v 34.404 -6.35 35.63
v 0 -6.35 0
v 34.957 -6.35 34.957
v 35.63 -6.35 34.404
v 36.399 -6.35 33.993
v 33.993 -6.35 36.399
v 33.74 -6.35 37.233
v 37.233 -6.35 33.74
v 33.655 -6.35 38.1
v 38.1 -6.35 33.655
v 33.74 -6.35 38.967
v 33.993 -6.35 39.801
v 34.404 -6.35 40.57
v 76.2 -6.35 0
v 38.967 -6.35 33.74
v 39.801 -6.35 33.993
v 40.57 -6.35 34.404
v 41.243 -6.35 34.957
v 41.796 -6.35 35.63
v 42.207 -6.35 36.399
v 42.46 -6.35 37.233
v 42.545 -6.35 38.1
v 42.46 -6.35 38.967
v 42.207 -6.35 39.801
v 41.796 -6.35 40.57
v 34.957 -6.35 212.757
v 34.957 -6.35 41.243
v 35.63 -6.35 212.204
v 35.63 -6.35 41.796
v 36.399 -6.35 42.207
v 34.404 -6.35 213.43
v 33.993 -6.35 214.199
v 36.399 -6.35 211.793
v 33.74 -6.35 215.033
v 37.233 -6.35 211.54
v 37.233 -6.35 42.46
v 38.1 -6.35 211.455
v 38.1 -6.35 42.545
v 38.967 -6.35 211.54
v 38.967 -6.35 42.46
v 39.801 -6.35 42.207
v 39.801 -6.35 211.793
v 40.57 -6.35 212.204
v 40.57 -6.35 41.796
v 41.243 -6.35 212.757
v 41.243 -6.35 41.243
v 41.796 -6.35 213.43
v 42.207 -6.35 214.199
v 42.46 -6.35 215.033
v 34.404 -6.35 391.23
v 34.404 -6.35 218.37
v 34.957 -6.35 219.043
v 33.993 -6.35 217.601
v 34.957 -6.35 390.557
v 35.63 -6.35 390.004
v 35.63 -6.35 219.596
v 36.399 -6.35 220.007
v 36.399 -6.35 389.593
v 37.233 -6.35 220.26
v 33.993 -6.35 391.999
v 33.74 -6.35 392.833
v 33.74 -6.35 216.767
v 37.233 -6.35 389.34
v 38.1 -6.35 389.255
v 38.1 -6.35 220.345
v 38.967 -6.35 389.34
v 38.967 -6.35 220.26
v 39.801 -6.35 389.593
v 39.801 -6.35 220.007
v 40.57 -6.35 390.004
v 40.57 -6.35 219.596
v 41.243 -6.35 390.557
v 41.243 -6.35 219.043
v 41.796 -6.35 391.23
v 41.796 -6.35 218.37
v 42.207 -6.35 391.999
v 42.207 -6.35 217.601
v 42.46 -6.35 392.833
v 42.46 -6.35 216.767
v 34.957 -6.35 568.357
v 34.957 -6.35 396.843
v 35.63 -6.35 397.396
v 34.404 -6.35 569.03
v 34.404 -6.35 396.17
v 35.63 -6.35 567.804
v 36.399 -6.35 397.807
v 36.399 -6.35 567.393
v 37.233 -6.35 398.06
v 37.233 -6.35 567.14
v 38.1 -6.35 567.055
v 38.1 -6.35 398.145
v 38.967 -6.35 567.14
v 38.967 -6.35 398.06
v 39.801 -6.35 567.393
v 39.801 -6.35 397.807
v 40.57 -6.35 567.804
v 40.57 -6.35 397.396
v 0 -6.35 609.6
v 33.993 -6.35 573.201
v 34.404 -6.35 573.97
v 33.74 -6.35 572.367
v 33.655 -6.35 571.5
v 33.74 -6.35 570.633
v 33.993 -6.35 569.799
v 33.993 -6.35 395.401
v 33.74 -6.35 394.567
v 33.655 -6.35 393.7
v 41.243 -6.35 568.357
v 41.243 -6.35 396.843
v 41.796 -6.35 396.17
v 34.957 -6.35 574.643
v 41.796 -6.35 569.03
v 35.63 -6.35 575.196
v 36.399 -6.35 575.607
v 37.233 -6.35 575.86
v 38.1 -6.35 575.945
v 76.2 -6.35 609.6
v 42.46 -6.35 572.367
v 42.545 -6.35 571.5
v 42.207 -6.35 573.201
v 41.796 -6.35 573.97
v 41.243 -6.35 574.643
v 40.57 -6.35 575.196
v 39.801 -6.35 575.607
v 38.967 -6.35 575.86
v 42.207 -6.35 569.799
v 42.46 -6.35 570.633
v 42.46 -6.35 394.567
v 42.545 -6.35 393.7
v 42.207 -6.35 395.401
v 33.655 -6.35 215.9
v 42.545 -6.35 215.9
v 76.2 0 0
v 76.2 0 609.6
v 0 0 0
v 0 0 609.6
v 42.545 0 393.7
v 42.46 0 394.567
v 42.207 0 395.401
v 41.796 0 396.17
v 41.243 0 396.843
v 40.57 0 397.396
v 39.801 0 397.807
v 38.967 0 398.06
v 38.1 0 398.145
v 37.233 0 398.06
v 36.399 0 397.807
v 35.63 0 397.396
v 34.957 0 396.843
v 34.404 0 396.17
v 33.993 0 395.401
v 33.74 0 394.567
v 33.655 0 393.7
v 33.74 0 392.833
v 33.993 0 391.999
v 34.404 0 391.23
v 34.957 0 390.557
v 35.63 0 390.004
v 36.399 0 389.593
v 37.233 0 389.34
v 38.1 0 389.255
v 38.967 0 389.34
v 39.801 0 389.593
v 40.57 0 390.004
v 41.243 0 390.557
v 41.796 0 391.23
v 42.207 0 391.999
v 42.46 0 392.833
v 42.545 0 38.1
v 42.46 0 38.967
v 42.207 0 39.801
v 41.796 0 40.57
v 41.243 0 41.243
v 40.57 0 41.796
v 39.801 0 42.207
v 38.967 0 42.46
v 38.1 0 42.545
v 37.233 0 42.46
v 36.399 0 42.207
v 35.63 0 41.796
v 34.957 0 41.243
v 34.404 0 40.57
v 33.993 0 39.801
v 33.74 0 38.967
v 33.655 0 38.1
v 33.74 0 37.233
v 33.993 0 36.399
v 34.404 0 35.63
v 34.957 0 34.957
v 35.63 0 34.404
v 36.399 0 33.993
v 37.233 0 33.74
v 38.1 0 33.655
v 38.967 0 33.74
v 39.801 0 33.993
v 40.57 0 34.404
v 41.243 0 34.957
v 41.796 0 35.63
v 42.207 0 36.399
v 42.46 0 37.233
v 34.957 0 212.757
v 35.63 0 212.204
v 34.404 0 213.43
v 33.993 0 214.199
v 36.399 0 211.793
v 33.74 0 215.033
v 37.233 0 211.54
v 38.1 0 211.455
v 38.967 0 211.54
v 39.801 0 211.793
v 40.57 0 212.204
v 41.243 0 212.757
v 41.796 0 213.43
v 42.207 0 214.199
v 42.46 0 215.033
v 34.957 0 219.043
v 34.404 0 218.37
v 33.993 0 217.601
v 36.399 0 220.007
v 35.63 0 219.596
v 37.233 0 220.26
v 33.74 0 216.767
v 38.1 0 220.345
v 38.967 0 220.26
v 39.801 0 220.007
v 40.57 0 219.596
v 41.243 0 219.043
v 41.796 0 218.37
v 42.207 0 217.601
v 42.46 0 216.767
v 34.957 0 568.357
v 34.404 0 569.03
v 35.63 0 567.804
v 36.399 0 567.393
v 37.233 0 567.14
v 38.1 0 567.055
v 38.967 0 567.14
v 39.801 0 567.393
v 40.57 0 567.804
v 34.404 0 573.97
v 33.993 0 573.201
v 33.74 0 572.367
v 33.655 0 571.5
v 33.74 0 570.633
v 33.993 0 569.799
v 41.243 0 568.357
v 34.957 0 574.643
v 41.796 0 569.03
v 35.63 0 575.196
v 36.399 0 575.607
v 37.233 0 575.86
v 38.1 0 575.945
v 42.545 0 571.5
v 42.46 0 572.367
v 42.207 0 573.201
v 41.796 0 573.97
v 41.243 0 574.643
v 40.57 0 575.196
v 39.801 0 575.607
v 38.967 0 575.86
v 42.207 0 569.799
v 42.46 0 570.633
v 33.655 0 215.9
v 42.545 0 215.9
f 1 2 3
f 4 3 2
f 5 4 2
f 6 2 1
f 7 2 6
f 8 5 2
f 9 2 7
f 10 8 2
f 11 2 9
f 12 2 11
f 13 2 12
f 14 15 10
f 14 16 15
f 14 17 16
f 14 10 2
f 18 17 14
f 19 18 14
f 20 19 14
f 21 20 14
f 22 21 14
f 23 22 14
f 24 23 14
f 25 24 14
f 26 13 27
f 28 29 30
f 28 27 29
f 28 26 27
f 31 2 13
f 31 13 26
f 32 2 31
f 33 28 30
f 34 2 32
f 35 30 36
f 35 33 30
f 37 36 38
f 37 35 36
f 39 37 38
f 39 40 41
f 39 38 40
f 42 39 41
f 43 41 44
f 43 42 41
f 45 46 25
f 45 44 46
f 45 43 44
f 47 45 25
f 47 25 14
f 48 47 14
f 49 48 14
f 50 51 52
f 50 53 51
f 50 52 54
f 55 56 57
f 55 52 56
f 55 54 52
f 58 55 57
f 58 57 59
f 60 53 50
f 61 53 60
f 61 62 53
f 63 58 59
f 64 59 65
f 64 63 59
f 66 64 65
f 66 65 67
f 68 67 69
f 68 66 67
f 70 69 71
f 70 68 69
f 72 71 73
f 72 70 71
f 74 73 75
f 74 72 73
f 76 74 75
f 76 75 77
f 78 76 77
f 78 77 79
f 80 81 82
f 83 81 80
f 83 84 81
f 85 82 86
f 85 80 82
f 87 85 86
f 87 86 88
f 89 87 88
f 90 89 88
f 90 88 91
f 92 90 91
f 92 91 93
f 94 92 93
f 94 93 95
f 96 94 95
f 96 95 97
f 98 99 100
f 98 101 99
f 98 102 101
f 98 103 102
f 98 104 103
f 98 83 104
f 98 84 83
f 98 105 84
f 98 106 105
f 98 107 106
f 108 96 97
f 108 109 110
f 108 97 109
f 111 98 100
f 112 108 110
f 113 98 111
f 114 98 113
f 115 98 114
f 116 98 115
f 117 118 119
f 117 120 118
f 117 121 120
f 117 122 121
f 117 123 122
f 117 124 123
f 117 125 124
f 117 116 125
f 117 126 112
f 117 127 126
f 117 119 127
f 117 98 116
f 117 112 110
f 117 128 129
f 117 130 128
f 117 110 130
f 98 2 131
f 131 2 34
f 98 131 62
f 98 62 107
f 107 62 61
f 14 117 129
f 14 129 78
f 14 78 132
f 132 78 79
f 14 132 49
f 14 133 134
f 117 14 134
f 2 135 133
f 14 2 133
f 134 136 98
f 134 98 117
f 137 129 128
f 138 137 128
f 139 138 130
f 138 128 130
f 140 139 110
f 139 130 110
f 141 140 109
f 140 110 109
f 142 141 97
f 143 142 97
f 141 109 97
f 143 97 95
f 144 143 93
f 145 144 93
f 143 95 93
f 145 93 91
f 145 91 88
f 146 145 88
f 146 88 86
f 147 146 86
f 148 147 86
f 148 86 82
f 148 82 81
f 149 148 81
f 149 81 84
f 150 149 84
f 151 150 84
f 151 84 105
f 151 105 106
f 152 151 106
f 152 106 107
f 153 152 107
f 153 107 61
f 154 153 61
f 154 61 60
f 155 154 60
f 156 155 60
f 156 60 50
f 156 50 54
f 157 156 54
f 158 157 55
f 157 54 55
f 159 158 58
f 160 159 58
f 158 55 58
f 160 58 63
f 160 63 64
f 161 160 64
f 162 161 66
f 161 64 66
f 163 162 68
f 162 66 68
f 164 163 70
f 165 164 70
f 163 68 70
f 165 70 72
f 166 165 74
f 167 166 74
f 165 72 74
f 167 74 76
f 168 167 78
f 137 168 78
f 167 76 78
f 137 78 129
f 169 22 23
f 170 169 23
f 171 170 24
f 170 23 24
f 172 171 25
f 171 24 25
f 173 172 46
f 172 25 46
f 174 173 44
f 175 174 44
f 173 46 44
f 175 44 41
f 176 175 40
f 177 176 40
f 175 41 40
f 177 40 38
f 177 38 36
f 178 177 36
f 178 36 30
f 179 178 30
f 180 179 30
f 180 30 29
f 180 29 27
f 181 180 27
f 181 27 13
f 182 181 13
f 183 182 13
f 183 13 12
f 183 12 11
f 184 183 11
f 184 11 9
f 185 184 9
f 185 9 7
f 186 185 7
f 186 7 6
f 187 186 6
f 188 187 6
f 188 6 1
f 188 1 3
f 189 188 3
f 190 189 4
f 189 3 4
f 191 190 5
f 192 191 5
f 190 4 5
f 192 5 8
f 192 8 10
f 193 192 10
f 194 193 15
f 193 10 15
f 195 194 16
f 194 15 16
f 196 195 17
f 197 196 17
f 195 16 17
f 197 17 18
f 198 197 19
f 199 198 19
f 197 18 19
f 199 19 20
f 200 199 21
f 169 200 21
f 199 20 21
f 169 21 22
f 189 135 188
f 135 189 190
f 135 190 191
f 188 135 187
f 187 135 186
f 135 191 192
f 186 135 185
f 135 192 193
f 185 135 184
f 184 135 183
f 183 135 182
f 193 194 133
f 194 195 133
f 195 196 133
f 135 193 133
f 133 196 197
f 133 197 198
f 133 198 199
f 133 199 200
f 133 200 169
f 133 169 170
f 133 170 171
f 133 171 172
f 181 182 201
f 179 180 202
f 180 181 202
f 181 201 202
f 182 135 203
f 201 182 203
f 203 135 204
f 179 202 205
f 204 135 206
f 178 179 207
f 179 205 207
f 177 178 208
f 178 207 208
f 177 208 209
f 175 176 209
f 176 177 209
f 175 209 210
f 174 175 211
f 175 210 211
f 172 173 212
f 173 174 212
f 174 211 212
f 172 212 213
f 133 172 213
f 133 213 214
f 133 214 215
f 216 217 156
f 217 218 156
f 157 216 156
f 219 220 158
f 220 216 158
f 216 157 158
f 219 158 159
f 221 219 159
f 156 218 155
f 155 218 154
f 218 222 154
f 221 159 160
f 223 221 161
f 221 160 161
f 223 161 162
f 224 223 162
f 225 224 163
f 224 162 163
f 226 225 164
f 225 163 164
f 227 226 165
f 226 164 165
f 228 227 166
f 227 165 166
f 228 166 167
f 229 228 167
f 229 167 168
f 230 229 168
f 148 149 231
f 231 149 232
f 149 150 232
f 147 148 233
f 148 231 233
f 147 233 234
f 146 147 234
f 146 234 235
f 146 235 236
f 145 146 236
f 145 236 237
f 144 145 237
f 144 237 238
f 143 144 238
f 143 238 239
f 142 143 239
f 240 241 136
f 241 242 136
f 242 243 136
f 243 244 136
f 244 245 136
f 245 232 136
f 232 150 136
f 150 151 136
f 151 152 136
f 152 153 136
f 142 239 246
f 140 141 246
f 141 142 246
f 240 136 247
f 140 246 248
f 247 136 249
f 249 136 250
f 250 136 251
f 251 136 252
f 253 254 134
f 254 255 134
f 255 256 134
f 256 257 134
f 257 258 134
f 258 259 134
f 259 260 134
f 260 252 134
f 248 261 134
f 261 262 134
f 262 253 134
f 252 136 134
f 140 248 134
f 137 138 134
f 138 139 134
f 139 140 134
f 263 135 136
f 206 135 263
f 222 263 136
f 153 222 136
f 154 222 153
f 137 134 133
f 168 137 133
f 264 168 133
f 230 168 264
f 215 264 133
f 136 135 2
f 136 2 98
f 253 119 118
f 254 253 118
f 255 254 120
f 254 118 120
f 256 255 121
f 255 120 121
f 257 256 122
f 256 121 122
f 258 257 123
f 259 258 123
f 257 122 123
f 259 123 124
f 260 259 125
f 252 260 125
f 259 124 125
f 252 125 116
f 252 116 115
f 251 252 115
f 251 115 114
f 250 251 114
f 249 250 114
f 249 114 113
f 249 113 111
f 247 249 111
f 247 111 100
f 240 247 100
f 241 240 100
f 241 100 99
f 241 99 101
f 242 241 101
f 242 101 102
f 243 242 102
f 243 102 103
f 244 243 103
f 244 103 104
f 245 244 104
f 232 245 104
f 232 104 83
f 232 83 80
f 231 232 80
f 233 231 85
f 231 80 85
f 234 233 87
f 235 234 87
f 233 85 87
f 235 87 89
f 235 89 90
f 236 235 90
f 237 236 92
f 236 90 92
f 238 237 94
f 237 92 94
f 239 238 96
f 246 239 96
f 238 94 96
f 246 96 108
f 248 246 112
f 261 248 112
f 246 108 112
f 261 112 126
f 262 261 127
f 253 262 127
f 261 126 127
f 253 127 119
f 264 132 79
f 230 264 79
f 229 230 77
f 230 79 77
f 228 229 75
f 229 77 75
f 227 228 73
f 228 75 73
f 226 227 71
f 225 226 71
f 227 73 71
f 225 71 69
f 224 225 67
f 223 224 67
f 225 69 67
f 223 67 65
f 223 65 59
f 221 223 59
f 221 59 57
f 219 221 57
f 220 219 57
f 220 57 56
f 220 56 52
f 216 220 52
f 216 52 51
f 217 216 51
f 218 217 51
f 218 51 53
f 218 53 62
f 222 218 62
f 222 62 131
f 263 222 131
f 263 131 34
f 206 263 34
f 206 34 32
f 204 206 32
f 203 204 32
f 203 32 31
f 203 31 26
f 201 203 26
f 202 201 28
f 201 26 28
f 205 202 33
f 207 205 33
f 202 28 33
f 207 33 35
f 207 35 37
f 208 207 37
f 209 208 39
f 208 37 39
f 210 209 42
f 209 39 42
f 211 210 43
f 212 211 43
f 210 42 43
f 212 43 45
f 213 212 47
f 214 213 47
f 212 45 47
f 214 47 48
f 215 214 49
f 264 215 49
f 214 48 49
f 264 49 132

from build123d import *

# Parameters (mm, degrees)
F0_W     = 76.2
F0_H     = 609.6
F1_DEPTH = 6.35
F2_R     = 4.445
F3_DEPTH = 6.351


with BuildPart() as f1:
    # F0 (on Front) → F1 (new body)
    with BuildSketch(Plane.XZ):
        with Locations((38.1, 304.8)):
            Rectangle(F0_W, F0_H)
    extrude(amount=F1_DEPTH)

    # F2 (on face) → F3 (cut, through all)
    with BuildSketch(Plane.XZ.offset(6.35)):
        with Locations((38.1, 571.5)):
            Circle(F2_R)
        with Locations((38.1, 393.7)):
            Circle(F2_R)
        with Locations((38.1, 215.9)):
            Circle(F2_R)
        with Locations((38.1, 38.1)):
            Circle(F2_R)
    extrude(amount=-F3_DEPTH, mode=Mode.SUBTRACT)


solid = f1.part
